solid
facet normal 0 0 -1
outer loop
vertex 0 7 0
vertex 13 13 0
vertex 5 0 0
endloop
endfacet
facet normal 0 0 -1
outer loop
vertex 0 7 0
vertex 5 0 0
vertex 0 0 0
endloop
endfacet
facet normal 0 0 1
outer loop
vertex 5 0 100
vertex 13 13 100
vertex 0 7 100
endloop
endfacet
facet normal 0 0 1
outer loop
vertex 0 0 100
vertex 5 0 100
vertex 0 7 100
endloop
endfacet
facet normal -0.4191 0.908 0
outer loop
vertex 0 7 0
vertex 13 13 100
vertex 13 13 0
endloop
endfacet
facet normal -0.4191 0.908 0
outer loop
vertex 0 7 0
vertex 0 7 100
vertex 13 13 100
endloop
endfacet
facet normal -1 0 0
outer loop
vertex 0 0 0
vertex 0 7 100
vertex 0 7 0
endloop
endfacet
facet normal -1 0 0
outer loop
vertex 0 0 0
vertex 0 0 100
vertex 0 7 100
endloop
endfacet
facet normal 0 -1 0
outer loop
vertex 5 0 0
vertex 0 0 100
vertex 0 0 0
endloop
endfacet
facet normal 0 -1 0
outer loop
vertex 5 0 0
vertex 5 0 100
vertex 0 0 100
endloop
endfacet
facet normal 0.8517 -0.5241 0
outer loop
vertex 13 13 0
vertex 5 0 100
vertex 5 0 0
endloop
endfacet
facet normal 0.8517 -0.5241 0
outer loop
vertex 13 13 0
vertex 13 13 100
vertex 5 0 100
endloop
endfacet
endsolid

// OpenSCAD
linear_extrude(100.0000){polygon(points=[[0.0,0.0],[5.0,0.0],[13.0,13.0],[0.0,7.0]]);}
